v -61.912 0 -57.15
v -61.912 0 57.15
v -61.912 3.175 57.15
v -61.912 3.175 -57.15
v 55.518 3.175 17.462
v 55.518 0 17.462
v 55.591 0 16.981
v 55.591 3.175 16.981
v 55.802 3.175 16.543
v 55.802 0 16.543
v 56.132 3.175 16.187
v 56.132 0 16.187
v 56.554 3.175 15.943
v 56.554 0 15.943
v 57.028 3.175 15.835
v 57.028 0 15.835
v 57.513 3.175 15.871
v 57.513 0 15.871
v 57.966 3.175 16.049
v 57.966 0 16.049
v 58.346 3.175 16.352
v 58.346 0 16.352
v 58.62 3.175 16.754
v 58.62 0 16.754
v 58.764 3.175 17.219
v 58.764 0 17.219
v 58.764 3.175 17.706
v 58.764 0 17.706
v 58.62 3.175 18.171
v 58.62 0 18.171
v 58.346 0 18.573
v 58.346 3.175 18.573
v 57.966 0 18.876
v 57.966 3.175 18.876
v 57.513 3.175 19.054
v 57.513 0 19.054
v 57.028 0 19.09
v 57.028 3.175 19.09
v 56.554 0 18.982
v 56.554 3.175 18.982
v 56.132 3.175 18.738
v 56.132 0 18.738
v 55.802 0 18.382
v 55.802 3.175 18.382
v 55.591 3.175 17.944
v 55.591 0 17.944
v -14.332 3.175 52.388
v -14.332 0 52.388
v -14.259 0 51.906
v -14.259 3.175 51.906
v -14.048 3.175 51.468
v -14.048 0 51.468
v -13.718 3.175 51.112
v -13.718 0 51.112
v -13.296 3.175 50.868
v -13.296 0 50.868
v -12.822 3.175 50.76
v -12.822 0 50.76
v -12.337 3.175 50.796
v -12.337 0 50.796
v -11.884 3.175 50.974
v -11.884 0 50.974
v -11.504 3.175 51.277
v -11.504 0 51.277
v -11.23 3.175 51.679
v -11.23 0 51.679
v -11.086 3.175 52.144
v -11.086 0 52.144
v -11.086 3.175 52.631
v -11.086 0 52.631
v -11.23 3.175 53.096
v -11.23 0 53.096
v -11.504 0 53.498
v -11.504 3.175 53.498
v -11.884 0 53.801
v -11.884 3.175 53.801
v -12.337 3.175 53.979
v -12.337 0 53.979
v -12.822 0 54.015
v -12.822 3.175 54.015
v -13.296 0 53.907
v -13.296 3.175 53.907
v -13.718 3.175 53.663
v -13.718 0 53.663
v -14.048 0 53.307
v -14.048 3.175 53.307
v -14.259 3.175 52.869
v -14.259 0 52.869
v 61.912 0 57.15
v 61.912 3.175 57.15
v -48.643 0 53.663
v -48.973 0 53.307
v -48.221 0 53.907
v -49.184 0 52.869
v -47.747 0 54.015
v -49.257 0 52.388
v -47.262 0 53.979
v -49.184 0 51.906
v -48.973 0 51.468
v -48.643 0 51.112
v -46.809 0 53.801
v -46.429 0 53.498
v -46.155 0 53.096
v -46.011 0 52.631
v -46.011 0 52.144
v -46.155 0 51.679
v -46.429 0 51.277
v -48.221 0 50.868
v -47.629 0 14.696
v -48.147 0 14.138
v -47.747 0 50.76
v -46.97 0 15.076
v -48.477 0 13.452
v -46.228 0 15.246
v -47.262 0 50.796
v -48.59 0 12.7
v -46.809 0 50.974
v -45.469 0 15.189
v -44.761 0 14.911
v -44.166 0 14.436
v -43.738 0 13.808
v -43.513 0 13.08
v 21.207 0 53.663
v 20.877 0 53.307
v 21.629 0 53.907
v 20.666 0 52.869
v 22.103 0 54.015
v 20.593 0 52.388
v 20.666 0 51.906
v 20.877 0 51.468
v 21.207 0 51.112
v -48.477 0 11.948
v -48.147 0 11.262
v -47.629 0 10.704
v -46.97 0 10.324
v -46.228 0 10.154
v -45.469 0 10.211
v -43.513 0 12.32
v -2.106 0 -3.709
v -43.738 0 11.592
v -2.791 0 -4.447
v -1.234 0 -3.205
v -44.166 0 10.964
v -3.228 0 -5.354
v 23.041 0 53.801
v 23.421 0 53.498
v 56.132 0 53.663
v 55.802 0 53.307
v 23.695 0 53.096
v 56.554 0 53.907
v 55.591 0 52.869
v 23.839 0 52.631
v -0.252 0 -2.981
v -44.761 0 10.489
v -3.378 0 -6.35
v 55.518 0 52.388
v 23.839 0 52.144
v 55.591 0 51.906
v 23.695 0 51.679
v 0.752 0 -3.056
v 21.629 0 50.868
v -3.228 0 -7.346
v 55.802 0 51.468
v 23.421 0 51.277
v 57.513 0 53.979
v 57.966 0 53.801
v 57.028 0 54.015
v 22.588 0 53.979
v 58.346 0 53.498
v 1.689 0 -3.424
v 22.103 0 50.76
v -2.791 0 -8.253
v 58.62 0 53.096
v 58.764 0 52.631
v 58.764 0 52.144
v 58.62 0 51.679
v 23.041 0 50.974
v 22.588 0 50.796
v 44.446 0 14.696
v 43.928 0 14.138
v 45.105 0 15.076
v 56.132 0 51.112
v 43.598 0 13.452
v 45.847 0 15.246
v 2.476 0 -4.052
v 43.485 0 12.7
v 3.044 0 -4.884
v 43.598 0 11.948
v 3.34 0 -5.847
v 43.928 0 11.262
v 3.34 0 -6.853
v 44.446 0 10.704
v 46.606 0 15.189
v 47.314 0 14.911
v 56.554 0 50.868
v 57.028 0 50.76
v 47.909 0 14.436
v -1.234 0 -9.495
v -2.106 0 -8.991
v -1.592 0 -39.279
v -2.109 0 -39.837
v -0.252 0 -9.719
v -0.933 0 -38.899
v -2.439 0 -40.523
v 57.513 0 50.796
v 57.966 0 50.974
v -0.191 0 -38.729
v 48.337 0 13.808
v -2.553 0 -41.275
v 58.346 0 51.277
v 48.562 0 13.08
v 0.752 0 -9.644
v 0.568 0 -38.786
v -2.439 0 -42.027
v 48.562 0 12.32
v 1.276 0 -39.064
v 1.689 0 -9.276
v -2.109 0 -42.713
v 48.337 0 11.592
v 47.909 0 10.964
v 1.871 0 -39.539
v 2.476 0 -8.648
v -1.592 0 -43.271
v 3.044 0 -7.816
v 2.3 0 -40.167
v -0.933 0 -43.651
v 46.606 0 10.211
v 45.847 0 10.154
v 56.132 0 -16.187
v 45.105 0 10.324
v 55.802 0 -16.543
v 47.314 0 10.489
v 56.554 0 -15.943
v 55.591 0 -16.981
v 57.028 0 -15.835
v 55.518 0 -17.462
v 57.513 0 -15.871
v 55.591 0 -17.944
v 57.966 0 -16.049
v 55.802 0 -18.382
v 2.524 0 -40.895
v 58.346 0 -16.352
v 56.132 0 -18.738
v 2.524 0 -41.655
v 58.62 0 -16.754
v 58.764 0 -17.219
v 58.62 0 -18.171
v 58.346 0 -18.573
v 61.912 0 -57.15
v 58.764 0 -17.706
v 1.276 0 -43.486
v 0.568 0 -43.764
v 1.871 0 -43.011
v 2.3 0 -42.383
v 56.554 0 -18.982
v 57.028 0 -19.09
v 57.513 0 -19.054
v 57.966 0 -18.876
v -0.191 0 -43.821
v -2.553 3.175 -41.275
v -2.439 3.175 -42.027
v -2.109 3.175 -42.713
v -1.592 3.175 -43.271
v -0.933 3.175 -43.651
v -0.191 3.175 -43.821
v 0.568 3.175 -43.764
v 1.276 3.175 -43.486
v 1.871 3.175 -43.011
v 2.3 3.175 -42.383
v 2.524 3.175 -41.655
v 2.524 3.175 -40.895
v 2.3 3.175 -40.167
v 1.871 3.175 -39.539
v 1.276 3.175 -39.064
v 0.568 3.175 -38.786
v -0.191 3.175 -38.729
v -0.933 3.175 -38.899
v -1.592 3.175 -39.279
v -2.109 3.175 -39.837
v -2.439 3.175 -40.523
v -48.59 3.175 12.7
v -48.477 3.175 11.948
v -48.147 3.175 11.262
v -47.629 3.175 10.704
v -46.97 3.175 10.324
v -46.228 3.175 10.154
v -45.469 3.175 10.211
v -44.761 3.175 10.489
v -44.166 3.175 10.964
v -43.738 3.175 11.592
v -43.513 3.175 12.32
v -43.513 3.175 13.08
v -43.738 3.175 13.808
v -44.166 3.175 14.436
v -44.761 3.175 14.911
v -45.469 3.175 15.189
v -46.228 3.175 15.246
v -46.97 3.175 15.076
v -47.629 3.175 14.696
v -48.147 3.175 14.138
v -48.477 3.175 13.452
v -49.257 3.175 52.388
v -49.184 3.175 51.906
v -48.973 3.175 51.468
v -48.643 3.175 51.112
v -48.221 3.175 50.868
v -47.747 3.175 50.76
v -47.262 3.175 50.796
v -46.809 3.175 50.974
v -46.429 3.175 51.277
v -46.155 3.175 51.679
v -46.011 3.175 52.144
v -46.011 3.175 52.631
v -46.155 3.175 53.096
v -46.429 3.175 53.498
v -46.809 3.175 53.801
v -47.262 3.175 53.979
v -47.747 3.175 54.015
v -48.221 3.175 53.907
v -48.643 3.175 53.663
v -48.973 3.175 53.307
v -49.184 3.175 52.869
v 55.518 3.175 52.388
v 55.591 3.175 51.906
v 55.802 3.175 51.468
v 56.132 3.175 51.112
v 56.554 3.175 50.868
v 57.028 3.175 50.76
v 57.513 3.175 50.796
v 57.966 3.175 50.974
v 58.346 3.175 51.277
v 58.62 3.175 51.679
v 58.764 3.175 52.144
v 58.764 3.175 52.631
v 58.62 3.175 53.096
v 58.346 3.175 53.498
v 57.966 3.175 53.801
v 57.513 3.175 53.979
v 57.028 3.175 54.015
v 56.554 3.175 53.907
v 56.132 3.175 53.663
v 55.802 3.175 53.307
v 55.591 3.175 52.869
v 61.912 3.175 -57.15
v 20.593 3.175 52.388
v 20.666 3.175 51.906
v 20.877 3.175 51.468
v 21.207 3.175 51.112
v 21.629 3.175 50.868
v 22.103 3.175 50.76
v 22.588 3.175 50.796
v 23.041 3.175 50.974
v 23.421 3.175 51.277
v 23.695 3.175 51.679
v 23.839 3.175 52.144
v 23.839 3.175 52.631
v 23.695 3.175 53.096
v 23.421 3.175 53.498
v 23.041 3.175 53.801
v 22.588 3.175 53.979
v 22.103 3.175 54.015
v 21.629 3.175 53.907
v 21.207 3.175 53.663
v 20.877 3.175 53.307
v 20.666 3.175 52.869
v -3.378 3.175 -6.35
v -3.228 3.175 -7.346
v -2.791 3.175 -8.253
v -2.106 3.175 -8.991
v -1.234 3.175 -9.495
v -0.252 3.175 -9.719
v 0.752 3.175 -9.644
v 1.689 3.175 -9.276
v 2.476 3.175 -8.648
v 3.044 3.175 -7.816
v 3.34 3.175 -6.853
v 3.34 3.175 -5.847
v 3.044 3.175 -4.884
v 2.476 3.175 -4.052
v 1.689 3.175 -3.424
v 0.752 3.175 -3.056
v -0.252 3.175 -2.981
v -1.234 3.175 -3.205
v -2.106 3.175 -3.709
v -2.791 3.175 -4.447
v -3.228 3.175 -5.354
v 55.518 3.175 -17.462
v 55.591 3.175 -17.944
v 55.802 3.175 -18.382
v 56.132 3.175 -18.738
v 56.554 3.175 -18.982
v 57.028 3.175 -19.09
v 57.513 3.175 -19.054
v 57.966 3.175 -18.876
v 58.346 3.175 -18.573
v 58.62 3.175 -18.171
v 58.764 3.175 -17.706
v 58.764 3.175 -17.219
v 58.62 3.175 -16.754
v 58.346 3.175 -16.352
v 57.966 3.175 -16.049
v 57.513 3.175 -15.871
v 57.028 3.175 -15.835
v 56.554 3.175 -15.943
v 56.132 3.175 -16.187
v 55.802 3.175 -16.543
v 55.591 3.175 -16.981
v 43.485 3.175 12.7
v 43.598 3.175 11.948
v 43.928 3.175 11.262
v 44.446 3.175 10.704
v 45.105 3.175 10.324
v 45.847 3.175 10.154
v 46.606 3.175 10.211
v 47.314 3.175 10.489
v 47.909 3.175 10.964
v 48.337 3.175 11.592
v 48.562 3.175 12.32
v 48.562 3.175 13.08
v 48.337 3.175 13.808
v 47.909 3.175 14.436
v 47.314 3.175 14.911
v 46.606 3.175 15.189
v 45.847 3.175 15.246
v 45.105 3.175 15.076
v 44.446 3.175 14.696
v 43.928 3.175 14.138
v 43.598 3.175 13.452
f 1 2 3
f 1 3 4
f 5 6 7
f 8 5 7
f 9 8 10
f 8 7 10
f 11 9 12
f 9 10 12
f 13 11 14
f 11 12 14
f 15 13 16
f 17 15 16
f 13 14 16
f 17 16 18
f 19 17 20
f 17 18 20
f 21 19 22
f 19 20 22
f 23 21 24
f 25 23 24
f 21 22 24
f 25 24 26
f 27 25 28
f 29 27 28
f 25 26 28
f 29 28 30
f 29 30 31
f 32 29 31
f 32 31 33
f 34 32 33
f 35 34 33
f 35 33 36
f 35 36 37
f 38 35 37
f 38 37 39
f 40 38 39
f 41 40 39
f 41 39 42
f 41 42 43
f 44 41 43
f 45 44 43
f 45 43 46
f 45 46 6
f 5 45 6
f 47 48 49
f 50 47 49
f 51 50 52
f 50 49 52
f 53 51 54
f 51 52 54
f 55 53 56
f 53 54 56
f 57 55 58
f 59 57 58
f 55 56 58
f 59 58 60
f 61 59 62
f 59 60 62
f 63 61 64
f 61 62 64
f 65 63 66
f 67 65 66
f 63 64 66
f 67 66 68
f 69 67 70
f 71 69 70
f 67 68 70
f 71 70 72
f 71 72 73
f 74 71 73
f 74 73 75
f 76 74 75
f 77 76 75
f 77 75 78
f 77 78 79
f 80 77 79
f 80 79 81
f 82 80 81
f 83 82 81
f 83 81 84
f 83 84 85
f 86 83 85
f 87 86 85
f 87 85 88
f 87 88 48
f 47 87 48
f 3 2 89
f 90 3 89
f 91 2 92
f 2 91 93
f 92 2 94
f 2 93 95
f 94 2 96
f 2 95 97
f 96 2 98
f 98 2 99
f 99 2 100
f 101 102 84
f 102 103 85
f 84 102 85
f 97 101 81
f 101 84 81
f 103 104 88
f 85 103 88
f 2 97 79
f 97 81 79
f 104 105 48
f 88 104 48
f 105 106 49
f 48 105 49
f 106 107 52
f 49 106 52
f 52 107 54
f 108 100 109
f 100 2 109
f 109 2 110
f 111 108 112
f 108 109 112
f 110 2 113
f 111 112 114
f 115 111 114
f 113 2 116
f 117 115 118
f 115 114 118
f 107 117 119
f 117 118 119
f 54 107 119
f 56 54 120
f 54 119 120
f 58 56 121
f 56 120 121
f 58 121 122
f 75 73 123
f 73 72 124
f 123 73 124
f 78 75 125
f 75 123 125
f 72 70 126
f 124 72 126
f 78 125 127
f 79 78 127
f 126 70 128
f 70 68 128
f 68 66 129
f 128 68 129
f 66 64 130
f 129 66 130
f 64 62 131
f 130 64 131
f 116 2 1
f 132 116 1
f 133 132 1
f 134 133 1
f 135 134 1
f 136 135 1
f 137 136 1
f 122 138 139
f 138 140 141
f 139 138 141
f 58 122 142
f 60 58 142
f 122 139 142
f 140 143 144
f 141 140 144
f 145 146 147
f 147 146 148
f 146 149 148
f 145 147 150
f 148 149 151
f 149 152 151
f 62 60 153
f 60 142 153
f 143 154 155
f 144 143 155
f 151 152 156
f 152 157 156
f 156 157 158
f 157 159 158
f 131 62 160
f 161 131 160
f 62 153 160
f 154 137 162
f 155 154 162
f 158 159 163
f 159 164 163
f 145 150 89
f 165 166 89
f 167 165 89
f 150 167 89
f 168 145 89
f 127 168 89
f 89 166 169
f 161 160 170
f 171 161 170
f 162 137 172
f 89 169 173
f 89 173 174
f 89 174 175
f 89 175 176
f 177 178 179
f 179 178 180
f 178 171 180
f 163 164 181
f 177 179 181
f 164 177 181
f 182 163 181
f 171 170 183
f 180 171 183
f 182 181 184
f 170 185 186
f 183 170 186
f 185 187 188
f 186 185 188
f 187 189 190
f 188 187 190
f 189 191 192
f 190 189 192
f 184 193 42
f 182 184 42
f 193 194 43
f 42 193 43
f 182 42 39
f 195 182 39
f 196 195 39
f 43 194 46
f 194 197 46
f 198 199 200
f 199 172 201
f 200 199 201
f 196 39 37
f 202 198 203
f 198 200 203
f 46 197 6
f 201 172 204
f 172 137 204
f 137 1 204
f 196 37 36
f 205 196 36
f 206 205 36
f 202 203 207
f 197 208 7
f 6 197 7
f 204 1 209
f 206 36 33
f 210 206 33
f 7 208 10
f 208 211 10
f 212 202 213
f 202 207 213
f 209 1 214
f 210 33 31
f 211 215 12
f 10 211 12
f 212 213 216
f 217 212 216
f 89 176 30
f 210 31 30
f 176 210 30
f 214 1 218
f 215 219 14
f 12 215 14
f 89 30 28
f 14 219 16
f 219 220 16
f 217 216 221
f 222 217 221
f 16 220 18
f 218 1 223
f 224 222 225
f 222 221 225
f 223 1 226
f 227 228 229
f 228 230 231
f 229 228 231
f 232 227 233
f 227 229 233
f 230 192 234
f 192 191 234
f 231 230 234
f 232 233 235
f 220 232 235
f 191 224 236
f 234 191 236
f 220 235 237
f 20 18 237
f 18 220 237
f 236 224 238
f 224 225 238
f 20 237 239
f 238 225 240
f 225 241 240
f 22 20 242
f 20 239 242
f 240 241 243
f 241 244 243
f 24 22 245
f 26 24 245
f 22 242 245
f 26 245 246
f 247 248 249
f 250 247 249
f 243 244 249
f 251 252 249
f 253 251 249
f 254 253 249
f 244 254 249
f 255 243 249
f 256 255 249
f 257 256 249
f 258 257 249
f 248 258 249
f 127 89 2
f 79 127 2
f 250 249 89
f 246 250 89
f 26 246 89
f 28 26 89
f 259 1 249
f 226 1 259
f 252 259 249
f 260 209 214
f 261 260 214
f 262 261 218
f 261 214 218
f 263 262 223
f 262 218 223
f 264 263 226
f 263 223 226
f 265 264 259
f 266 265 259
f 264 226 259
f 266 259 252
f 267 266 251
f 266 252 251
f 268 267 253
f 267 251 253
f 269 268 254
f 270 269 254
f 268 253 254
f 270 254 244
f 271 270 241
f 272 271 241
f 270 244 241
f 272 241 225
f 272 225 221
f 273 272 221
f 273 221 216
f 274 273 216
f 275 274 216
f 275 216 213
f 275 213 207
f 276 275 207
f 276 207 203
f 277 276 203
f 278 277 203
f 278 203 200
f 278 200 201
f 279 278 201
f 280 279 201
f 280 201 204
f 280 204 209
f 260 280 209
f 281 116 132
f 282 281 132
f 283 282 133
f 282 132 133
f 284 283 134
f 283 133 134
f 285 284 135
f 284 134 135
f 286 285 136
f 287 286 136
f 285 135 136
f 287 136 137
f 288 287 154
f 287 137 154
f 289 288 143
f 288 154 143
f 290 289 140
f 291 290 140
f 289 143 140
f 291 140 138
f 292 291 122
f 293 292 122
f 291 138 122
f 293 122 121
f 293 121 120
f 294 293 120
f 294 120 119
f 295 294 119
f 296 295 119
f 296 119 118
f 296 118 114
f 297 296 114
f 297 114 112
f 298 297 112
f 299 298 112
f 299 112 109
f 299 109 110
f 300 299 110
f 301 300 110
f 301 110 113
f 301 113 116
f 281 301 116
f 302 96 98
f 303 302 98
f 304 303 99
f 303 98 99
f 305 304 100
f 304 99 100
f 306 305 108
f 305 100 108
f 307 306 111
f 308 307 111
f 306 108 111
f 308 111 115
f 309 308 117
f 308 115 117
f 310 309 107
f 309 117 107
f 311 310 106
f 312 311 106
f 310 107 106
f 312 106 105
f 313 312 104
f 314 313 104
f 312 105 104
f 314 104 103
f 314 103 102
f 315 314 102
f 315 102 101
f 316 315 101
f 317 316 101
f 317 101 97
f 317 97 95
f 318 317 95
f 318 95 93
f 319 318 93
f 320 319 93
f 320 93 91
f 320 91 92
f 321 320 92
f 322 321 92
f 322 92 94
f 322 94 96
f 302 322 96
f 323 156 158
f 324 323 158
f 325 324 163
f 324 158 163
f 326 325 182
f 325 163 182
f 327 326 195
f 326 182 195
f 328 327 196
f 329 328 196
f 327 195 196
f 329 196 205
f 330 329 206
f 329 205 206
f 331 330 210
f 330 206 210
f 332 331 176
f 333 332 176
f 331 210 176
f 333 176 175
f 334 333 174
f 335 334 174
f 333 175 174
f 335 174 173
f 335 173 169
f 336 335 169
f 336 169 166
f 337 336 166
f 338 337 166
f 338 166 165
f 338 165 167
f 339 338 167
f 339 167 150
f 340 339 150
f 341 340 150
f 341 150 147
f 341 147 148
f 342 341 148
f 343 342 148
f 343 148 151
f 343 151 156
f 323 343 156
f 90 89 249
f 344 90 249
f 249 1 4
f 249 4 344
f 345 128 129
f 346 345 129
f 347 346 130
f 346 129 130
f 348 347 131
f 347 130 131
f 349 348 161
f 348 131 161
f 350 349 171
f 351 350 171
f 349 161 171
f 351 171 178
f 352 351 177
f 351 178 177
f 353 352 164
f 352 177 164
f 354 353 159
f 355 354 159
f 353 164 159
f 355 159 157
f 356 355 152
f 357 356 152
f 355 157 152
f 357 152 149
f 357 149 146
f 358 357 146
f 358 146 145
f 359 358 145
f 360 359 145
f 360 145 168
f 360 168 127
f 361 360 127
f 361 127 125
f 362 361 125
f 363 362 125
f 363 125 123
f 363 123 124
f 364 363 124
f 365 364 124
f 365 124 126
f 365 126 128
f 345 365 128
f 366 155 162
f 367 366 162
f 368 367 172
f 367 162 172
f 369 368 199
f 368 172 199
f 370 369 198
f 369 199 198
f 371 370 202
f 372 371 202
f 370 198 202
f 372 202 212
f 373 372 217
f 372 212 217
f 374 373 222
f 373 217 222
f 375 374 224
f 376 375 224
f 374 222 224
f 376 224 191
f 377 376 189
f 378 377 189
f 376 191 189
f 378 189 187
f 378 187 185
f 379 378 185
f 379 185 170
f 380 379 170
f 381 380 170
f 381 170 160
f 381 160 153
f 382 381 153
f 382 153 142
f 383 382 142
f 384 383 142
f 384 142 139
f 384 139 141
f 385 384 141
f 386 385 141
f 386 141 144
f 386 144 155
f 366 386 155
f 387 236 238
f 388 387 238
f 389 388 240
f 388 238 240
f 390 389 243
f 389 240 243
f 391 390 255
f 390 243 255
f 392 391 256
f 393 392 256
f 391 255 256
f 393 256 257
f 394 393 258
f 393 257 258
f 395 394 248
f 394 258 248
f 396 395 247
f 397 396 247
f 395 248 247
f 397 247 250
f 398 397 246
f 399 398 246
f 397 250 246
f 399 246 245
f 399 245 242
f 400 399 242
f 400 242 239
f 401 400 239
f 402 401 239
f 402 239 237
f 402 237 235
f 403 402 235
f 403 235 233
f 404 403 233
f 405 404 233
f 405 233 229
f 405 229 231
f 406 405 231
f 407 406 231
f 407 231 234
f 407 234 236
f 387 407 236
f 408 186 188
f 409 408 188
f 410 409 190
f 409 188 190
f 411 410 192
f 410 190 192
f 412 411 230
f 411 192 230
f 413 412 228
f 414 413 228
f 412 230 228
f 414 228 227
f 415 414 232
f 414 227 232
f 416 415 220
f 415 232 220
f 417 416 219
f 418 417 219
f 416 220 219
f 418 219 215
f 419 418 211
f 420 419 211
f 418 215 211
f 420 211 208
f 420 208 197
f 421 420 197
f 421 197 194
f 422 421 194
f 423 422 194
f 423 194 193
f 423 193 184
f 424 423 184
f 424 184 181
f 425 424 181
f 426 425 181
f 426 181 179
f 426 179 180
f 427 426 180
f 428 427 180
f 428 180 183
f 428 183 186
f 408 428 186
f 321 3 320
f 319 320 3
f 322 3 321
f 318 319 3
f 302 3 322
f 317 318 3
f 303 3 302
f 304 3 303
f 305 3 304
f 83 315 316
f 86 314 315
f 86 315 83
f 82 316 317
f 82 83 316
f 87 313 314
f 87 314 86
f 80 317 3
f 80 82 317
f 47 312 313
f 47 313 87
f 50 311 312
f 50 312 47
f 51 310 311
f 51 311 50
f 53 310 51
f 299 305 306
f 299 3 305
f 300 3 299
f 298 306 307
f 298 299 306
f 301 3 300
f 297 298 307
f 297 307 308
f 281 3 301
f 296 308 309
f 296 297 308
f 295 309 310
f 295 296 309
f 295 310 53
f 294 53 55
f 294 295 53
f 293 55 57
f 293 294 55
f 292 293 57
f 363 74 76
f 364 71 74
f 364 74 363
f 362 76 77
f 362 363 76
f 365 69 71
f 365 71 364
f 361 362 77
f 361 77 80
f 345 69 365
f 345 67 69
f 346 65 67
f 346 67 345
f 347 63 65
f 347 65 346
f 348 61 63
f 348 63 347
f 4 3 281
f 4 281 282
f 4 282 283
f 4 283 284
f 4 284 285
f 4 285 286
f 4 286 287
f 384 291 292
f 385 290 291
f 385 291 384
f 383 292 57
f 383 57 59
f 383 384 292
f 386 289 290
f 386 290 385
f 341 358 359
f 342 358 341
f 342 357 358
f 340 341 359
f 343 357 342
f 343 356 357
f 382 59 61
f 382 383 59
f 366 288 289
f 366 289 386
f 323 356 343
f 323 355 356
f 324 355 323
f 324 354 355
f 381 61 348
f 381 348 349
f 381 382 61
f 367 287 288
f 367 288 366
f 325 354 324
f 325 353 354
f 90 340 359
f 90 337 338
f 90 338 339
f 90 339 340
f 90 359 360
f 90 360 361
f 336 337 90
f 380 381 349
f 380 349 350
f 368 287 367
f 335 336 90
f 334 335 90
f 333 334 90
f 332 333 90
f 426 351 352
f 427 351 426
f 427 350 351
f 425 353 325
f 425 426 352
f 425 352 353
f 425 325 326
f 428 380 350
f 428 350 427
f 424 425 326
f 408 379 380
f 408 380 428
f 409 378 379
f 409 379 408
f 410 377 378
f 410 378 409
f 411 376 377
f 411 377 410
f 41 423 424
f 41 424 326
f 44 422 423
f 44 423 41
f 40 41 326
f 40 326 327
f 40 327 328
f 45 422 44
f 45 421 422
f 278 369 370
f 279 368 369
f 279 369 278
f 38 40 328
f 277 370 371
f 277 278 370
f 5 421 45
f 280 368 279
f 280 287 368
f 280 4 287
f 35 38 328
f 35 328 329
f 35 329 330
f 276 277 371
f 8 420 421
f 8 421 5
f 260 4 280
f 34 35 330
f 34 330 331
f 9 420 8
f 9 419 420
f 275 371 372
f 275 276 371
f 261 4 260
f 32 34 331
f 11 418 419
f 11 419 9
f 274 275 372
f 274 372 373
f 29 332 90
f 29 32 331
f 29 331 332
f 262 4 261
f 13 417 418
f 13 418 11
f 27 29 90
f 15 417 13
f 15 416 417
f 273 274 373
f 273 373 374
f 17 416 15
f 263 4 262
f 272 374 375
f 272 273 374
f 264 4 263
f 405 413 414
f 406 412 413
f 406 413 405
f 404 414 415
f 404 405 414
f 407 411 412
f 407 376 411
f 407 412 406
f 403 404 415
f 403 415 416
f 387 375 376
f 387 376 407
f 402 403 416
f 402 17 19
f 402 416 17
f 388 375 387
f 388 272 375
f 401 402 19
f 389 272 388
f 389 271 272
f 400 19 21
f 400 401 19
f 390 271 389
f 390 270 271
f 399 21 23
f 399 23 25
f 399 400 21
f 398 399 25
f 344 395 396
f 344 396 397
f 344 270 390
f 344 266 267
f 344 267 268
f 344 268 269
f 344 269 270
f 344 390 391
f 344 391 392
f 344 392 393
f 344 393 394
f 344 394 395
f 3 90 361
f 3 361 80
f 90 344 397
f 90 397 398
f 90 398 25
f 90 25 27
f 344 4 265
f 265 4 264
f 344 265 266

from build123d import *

# Parameters (mm, degrees)
SKETCH1_W                                = 123.825
SKETCH1_H                                = 114.3
PLATE_DEPTH                              = 3.175
FORCE_PLATE_POST_1_4_20_CLEARANCE_HOLE_D = 6.7564
F_4_CLEARANCE_HOLE1_D                    = 3.2639
F_10_CLEARANCE_HOLE1_D                   = 5.1054


with BuildPart() as part:
    # Sketch1 → Plate (new body)
    with BuildSketch(Plane(origin=(0, 0, 0), x_dir=(1, 0, 0), z_dir=(0, 1, 0))):
        Rectangle(SKETCH1_W, SKETCH1_H)
    extrude(amount=PLATE_DEPTH)

    # Force Plate Post (1/4"-20 Clearance Hole) (through all)
    with Locations(Plane(origin=(0, 3.175, 0), x_dir=(1, 0, 0), z_dir=(0, 1, 0))):
        with Locations((0, 6.35)):
            Hole(FORCE_PLATE_POST_1_4_20_CLEARANCE_HOLE_D / 2)

    # #4 Clearance Hole1 (through all)
    with Locations(Plane(origin=(0, 3.175, 0), x_dir=(1, 0, 0), z_dir=(0, 1, 0))):
        with Locations((57.15, -52.3875), (57.15, -17.4625), (57.15, 17.4625), (22.225, -52.3875), (-12.7, -52.3875), (-47.625, -52.3875)):
            Hole(F_4_CLEARANCE_HOLE1_D / 2)

    # #10 Clearance Hole1 (through all)
    with Locations(Plane(origin=(0, 3.175, 0), x_dir=(1, 0, 0), z_dir=(0, 1, 0))):
        with Locations((0, 41.275), (-46.0375, -12.7), (46.0375, -12.7)):
            Hole(F_10_CLEARANCE_HOLE1_D / 2)


solid = part.part
